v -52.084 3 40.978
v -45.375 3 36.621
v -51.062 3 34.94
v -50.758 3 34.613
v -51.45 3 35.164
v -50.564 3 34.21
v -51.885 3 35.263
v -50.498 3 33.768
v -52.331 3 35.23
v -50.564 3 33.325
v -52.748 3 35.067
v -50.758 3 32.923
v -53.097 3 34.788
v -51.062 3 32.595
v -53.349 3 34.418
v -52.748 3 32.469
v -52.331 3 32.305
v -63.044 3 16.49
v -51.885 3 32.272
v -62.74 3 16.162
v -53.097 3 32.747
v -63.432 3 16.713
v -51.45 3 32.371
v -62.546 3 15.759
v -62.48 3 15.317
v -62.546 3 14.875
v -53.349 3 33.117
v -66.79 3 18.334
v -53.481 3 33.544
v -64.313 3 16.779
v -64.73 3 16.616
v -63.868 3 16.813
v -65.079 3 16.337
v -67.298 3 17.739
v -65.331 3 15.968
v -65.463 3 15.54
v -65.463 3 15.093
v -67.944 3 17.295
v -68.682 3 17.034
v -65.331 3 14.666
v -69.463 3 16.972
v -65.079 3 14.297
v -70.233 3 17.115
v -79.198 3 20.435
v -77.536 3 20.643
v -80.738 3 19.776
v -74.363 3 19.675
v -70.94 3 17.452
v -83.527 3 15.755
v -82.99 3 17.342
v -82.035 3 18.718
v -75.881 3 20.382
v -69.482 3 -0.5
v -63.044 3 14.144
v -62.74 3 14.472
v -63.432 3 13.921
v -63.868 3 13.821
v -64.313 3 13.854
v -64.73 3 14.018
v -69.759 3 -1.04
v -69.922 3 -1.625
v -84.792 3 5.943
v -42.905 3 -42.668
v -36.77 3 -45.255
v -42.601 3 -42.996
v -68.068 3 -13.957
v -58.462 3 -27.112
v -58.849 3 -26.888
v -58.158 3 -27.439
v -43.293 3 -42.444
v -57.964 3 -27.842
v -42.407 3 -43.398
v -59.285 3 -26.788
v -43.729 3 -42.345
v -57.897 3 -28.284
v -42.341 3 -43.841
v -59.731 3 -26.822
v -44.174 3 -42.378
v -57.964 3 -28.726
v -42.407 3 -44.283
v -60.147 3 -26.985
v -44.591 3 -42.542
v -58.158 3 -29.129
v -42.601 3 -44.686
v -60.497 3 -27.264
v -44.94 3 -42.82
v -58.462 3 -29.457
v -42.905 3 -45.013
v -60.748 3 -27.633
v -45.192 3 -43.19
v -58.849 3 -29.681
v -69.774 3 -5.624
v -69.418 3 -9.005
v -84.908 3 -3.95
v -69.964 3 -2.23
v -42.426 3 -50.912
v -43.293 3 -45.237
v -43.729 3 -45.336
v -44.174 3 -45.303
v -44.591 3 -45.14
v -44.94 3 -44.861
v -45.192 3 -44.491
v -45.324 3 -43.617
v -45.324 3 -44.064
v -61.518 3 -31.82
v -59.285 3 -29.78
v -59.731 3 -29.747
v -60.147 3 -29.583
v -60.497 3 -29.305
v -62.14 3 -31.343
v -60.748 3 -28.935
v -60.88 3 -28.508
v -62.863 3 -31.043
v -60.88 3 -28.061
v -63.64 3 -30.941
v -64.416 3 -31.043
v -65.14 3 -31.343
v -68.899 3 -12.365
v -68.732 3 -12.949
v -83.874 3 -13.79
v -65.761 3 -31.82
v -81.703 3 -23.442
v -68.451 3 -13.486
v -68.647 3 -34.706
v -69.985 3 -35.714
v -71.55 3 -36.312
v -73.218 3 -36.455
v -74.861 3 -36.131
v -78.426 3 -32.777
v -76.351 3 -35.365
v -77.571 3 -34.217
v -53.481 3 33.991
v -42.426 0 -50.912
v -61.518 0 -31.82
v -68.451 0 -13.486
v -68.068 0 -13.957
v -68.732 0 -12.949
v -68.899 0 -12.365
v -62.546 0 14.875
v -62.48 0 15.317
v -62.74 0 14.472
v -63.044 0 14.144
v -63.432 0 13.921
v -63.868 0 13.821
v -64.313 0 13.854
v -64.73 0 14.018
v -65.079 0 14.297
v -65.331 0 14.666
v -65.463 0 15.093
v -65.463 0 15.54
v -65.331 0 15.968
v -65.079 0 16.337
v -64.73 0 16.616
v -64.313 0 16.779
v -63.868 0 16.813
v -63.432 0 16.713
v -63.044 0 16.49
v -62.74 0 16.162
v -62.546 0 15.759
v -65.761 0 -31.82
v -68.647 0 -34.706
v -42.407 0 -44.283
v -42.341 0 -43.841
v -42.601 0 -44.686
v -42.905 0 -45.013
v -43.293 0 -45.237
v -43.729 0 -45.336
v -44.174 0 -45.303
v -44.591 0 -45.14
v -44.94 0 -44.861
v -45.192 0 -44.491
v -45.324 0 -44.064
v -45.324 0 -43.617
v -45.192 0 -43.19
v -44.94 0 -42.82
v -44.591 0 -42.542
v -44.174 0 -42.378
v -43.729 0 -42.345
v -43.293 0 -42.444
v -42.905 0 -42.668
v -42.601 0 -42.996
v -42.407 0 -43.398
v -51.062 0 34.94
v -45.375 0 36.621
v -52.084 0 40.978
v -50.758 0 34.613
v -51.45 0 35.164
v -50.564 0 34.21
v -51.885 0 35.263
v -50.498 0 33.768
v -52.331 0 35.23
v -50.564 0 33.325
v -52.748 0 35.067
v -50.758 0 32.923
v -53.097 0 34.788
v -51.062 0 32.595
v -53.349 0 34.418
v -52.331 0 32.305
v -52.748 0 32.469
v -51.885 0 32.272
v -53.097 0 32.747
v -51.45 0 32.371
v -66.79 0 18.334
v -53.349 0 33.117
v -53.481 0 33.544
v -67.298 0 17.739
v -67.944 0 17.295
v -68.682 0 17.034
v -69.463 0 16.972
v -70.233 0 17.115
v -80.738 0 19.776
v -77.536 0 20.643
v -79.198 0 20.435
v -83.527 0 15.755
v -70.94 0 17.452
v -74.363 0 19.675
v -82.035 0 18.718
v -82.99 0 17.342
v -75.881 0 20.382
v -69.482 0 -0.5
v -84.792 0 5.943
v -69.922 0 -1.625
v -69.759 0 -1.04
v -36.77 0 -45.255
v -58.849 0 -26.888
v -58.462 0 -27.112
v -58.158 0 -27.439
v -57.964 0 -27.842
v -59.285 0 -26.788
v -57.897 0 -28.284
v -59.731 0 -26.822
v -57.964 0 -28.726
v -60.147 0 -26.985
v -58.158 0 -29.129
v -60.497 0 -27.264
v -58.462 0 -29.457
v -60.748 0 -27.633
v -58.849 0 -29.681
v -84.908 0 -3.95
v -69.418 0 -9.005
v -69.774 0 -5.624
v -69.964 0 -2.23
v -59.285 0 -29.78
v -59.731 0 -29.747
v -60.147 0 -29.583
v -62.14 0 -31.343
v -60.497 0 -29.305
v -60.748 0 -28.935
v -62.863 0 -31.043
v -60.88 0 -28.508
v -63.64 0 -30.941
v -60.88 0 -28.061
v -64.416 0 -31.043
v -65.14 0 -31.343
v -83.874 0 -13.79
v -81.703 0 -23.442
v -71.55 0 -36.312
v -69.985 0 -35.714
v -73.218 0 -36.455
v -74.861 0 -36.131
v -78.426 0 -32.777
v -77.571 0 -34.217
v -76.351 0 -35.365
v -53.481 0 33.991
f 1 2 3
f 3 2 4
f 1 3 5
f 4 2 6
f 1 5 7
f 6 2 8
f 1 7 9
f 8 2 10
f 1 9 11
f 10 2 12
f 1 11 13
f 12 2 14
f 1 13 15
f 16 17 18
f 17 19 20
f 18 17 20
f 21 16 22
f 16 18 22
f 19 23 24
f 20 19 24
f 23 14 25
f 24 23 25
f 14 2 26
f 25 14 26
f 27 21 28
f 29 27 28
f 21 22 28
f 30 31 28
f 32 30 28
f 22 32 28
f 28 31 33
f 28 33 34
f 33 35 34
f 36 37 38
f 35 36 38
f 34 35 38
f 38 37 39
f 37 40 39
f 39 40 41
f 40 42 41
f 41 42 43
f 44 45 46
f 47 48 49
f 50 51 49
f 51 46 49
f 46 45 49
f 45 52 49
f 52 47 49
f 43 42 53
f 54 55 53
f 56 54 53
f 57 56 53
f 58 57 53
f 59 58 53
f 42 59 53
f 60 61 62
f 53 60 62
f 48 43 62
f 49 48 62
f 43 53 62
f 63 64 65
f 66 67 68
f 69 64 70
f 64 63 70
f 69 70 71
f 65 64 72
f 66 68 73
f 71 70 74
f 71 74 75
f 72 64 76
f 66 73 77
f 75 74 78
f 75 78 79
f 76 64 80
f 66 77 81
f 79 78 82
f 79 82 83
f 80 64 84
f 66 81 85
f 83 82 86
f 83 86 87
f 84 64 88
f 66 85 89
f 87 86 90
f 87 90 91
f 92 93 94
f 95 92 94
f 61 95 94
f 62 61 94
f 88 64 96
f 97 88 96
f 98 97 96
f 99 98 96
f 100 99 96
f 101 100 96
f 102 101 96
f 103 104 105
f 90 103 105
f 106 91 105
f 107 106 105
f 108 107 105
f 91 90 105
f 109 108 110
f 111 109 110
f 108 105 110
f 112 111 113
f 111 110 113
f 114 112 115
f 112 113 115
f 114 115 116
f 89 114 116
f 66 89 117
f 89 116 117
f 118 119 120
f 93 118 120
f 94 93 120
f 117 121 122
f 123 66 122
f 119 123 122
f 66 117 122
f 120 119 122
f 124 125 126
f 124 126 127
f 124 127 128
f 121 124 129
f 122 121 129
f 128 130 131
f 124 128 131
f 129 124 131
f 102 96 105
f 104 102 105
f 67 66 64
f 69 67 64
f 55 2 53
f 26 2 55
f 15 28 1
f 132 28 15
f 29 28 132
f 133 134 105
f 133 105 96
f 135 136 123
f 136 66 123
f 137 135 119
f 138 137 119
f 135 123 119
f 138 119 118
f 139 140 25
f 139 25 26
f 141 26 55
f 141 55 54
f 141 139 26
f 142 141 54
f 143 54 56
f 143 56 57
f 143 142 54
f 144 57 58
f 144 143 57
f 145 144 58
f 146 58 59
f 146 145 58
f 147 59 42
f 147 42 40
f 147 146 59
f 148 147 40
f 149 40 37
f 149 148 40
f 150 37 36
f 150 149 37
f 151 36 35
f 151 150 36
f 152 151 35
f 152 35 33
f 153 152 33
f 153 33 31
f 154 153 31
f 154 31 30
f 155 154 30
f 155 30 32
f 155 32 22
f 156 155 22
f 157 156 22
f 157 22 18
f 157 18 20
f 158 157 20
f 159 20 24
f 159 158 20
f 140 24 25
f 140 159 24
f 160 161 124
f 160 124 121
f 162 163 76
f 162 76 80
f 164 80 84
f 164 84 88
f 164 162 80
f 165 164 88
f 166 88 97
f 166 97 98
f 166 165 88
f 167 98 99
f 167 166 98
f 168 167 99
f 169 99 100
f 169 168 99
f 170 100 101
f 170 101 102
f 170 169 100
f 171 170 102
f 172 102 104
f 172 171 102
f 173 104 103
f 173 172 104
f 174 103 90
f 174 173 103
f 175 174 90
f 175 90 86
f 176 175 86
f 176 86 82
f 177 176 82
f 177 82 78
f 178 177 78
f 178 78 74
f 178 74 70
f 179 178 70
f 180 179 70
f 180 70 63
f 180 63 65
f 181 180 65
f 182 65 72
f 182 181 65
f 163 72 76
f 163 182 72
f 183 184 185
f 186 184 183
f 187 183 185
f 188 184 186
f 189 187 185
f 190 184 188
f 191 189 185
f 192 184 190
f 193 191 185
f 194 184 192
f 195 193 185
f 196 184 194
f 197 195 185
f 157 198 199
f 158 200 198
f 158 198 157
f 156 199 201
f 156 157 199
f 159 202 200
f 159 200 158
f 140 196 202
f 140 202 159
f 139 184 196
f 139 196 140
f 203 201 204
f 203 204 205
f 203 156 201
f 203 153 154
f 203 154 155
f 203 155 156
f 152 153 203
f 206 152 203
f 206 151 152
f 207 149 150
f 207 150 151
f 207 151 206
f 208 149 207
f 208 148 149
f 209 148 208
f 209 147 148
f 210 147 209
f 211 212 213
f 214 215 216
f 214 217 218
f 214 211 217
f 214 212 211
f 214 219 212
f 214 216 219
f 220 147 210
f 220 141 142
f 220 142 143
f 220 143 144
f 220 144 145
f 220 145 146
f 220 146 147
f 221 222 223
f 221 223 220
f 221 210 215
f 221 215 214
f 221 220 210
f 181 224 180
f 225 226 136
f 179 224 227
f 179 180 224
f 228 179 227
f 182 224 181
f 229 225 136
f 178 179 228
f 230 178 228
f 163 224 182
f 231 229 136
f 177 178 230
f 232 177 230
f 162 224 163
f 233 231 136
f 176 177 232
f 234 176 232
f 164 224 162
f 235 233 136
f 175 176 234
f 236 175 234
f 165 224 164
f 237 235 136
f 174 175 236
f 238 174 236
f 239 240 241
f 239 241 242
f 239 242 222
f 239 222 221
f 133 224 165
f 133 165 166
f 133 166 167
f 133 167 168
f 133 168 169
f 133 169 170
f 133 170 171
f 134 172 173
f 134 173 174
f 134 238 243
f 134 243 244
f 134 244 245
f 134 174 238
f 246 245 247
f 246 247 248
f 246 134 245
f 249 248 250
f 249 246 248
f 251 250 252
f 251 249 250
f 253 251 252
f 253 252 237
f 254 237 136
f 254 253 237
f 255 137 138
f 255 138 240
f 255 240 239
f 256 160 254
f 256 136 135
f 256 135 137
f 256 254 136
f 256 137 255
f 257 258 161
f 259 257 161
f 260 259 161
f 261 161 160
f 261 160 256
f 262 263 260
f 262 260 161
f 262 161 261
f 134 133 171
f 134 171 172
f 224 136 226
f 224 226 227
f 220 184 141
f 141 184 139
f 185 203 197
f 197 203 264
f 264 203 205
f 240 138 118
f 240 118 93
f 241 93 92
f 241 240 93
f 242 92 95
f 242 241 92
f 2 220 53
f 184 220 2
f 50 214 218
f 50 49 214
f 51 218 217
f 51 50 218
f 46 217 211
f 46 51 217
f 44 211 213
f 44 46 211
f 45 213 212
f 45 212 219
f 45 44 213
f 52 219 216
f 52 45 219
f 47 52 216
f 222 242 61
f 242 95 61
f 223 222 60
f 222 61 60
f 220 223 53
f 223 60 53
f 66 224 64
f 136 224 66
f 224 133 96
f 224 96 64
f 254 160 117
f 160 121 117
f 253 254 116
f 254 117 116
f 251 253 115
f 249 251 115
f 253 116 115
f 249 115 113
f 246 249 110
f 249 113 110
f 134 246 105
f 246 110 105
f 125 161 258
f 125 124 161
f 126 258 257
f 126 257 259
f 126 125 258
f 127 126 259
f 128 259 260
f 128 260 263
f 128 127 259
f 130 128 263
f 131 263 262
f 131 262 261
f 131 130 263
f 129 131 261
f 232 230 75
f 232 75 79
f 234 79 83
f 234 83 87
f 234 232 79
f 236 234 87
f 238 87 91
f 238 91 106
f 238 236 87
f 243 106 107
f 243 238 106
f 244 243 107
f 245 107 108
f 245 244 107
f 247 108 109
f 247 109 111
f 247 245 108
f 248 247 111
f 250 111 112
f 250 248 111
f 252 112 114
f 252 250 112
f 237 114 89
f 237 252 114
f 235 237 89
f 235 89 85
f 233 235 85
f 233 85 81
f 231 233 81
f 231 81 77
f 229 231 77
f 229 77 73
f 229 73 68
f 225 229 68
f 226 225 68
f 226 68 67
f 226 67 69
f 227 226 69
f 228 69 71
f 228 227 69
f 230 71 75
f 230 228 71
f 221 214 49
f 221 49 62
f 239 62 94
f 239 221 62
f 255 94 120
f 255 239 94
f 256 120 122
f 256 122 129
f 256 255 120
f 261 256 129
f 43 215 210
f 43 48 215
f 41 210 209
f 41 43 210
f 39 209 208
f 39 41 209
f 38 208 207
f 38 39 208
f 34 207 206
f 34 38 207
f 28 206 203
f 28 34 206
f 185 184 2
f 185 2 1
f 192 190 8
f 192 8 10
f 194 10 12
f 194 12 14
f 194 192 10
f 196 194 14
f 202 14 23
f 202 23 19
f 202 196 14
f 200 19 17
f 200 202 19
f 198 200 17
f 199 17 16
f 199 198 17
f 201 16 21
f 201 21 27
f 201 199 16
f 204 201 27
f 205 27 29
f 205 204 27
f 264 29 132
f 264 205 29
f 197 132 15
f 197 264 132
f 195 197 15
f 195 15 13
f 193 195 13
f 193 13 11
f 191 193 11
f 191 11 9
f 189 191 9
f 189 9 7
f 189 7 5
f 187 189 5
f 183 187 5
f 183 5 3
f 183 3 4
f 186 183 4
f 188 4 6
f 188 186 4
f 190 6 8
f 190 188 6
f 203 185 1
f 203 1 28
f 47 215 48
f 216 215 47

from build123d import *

# Parameters (mm, degrees)
SKETCH1_R           = 1.5
BOSS_EXTRUDE1_DEPTH = 3
FILLET1_R           = 6
FILLET2_R           = 3


with BuildPart() as part:
    # Sketch1 → Boss-Extrude1 (new body)
    with BuildSketch(Plane(origin=(0, 0, 0), x_dir=(1, 0, 0), z_dir=(0, 1, 0))):
        with BuildLine():
            Line((-74.629040009, 40.687914512), (-63.639610307, 29.69848481))
            Line((-63.639610307, 29.69848481), (-42.426406871, 50.911688245))
            Line((-42.426406871, 50.911688245), (-36.769552622, 45.254833996))
            Line((-36.769552622, 45.254833996), (-68.72500623, 13.299380388))
            ThreePointArc((-68.72500623, 13.299380388), (-69.616532676, 7.316992429), (-69.988296617, 1.279975229))
            Line((-69.988296617, 1.279975229), (-45.375058731, -36.621087439))
            Line((-45.375058731, -36.621087439), (-52.084423274, -40.978199719))
            Line((-52.084423274, -40.978199719), (-68.423594325, -15.81808268))
            Line((-68.423594325, -15.81808268), (-81.457709532, -24.282536066))
            ThreePointArc((-81.457709532, -24.282536066), (-84.534361106, 8.884919378), (-74.629040009, 40.687914512))
        make_face()
        with Locations((-43.840620434, 43.840620434)):
            Circle(SKETCH1_R, mode=Mode.SUBTRACT)
        with Locations((-59.39696962, 28.284271247)):
            Circle(SKETCH1_R, mode=Mode.SUBTRACT)
        with Locations((-51.997575213, -33.767620171)):
            Circle(SKETCH1_R, mode=Mode.SUBTRACT)
        with Locations((-63.979633983, -15.316867676)):
            Circle(SKETCH1_R, mode=Mode.SUBTRACT)
    extrude(amount=BOSS_EXTRUDE1_DEPTH)

    # Fillet1
    fillet1_edges = [part.edges().sort_by_distance(p)[0] for p in [
        (-74.629040009, 1.5, -40.687914512),
        (-81.457709532, 1.5, 24.282536066),
    ]]
    fillet(fillet1_edges, radius=FILLET1_R)

    # Fillet2
    fillet2_edges = [part.edges().sort_by_distance(p)[0] for p in [
        (-63.639610307, 1.5, -29.69848481),
        (-68.72500623, 1.5, -13.299380388),
        (-69.988296617, 1.5, -1.279975229),
        (-68.423594325, 1.5, 15.81808268),
    ]]
    fillet(fillet2_edges, radius=FILLET2_R)


solid = part.part
